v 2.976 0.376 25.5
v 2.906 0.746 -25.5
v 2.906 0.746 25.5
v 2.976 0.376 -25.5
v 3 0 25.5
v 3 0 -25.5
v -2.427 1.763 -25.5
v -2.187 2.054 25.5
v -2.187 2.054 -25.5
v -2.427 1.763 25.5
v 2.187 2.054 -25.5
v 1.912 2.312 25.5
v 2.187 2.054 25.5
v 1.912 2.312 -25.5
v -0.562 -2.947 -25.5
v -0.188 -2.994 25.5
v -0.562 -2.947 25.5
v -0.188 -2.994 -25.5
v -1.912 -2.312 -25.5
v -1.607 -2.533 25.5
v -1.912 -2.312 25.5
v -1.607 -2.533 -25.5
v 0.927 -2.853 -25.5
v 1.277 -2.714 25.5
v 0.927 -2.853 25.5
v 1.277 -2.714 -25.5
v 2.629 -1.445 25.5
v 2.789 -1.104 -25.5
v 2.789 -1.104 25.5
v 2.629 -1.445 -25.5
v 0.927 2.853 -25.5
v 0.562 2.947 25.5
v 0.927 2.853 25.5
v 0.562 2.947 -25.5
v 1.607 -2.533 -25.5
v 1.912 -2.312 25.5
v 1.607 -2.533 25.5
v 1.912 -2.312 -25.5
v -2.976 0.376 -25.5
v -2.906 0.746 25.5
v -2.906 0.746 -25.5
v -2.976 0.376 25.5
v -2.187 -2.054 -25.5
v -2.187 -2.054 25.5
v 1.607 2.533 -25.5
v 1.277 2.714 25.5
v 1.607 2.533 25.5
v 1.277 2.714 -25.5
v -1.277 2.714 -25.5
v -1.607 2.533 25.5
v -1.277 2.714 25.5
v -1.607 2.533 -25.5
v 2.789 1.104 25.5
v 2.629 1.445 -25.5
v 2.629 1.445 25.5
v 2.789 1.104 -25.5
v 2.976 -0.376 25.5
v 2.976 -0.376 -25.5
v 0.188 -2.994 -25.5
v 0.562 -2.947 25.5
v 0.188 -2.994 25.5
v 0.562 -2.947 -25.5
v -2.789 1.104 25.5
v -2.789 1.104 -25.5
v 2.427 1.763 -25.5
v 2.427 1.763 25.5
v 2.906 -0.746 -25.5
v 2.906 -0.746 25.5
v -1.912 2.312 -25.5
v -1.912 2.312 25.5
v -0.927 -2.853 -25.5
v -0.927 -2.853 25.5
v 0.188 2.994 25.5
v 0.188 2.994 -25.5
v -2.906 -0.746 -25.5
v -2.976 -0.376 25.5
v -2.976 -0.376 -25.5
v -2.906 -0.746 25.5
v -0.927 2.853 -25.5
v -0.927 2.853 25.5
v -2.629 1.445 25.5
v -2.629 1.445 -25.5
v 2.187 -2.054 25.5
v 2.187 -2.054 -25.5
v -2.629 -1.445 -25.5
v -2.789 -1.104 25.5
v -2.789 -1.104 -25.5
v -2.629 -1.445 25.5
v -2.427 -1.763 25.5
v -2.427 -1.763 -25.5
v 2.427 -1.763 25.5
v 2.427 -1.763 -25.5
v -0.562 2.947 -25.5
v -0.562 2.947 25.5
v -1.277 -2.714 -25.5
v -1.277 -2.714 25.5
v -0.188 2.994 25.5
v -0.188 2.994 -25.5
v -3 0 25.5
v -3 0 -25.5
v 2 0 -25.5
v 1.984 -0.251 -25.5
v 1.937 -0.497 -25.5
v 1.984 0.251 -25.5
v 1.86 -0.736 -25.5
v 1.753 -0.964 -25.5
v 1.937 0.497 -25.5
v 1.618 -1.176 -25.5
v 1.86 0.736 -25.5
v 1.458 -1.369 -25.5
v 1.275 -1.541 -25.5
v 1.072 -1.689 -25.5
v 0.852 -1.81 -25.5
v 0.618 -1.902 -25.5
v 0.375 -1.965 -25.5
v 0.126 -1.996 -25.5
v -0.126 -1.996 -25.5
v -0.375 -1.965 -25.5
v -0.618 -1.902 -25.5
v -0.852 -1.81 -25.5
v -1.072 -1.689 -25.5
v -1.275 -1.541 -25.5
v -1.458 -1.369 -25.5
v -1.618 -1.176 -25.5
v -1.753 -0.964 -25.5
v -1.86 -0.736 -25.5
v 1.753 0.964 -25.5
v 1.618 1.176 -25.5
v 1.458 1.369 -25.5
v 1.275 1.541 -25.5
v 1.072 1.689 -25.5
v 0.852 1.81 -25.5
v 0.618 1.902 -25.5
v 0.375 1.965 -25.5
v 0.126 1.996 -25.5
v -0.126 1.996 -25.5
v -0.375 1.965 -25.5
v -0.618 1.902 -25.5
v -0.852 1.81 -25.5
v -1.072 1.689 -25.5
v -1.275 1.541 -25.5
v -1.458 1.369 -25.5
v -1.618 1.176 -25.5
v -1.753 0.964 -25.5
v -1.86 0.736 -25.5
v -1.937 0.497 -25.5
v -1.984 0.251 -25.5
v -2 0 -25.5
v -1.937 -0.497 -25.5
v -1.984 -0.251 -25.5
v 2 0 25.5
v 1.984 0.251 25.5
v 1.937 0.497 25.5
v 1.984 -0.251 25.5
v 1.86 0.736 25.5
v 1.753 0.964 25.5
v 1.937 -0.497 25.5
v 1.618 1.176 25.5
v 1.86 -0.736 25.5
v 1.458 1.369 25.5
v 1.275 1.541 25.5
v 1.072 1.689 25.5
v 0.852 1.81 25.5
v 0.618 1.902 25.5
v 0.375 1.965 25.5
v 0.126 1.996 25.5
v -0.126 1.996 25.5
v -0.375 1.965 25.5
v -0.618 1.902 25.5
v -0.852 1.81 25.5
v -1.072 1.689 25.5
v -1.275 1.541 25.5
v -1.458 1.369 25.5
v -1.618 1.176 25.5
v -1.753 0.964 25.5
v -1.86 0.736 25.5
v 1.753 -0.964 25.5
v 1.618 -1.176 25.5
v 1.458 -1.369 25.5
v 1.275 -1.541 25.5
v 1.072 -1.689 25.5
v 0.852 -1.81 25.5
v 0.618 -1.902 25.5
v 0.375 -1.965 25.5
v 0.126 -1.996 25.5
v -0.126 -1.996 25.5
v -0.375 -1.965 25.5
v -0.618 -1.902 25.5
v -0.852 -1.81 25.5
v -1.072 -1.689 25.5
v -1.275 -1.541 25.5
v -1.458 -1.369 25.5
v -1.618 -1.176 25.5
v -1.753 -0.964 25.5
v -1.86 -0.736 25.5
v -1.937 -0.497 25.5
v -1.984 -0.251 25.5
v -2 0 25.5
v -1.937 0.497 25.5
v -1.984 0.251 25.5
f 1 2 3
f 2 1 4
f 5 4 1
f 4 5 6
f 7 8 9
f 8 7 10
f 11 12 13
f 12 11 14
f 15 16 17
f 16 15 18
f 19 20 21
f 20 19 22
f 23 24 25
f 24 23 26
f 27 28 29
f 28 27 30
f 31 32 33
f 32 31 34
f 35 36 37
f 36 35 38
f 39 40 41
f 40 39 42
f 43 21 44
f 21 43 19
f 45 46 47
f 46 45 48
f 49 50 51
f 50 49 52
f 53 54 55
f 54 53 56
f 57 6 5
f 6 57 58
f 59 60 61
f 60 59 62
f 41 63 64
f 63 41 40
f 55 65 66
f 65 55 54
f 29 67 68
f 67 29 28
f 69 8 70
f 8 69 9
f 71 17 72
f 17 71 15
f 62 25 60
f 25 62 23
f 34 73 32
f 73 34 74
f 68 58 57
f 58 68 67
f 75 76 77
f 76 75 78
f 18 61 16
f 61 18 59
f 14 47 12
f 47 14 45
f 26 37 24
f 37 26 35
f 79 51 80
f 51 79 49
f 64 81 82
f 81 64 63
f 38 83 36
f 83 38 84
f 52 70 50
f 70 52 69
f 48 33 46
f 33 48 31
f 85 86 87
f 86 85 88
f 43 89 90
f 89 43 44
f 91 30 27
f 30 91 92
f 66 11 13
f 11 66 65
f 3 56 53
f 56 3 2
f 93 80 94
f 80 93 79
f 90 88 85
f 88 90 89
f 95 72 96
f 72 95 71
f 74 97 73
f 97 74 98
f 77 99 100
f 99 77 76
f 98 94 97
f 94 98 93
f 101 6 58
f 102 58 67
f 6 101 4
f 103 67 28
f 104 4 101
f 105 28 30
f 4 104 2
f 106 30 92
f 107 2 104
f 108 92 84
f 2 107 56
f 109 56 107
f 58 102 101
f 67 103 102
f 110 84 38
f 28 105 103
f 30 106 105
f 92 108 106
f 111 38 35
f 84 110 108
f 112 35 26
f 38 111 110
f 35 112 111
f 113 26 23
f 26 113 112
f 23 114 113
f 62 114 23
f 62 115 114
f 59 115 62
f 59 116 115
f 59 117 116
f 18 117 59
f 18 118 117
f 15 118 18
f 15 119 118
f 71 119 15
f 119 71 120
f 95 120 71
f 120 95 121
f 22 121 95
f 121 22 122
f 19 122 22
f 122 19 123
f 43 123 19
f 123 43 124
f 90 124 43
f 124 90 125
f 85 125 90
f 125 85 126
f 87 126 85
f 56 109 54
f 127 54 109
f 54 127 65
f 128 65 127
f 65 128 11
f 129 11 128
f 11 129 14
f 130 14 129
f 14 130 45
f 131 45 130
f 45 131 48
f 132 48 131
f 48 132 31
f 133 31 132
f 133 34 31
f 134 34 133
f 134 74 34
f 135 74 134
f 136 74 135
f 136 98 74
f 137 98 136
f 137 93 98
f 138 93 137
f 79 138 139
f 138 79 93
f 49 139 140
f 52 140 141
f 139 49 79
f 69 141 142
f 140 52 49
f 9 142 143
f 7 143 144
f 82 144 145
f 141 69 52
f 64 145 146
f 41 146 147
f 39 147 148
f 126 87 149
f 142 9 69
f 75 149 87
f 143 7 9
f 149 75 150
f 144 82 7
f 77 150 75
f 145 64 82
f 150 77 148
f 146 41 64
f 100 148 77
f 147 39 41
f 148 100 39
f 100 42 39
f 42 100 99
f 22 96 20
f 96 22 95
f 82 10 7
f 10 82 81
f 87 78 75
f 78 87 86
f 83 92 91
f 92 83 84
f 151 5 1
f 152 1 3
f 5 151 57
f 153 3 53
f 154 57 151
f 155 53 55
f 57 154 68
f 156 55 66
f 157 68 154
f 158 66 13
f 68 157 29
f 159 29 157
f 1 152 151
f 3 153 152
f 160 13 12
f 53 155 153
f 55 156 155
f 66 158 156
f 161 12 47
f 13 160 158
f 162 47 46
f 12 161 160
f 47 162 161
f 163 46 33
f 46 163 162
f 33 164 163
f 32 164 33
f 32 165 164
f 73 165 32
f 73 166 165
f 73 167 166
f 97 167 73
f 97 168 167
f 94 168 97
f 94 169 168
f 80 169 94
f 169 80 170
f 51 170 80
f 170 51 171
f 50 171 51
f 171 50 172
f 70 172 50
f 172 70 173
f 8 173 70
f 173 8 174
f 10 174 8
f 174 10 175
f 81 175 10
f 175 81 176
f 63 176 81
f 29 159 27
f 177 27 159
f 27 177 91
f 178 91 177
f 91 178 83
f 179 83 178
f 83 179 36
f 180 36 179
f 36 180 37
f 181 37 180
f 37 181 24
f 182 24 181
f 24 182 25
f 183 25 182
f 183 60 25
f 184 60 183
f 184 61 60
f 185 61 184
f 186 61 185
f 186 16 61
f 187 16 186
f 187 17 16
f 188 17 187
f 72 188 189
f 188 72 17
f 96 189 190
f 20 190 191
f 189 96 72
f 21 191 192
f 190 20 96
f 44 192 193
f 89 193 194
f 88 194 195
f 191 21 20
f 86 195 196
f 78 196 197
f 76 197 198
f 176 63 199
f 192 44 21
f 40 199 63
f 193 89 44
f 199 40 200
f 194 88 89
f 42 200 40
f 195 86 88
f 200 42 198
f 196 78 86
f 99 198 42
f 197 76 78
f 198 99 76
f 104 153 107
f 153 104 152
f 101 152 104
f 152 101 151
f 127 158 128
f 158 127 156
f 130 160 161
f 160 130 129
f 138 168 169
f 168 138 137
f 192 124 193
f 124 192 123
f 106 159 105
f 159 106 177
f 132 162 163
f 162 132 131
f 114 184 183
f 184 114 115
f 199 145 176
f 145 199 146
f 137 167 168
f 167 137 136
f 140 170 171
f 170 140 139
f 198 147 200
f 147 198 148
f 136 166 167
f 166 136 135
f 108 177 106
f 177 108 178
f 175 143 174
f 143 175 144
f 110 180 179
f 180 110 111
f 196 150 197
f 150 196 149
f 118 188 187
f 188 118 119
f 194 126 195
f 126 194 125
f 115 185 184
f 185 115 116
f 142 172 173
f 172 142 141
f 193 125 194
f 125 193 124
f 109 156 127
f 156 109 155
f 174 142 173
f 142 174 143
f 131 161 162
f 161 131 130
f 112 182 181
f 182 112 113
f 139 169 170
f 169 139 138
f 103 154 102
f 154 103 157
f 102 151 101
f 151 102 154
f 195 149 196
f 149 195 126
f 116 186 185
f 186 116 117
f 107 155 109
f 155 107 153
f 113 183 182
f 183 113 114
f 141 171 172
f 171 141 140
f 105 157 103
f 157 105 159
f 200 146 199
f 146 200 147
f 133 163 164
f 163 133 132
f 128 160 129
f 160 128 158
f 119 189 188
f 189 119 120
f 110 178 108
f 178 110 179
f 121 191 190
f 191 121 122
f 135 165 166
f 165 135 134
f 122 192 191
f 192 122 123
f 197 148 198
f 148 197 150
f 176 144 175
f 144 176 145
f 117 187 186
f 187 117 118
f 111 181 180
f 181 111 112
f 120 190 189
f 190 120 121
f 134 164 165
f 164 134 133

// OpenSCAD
$fn = 50;


difference() {
	union() {
		translate(v = [0, 0, -25.5000000000]) {
			cylinder(h = 51, r = 3.0000000000);
		}
	}
	union() {
		translate(v = [0, 0, -100.0000000000]) {
			cylinder(h = 200, r = 2.0000000000);
		}
	}
}
